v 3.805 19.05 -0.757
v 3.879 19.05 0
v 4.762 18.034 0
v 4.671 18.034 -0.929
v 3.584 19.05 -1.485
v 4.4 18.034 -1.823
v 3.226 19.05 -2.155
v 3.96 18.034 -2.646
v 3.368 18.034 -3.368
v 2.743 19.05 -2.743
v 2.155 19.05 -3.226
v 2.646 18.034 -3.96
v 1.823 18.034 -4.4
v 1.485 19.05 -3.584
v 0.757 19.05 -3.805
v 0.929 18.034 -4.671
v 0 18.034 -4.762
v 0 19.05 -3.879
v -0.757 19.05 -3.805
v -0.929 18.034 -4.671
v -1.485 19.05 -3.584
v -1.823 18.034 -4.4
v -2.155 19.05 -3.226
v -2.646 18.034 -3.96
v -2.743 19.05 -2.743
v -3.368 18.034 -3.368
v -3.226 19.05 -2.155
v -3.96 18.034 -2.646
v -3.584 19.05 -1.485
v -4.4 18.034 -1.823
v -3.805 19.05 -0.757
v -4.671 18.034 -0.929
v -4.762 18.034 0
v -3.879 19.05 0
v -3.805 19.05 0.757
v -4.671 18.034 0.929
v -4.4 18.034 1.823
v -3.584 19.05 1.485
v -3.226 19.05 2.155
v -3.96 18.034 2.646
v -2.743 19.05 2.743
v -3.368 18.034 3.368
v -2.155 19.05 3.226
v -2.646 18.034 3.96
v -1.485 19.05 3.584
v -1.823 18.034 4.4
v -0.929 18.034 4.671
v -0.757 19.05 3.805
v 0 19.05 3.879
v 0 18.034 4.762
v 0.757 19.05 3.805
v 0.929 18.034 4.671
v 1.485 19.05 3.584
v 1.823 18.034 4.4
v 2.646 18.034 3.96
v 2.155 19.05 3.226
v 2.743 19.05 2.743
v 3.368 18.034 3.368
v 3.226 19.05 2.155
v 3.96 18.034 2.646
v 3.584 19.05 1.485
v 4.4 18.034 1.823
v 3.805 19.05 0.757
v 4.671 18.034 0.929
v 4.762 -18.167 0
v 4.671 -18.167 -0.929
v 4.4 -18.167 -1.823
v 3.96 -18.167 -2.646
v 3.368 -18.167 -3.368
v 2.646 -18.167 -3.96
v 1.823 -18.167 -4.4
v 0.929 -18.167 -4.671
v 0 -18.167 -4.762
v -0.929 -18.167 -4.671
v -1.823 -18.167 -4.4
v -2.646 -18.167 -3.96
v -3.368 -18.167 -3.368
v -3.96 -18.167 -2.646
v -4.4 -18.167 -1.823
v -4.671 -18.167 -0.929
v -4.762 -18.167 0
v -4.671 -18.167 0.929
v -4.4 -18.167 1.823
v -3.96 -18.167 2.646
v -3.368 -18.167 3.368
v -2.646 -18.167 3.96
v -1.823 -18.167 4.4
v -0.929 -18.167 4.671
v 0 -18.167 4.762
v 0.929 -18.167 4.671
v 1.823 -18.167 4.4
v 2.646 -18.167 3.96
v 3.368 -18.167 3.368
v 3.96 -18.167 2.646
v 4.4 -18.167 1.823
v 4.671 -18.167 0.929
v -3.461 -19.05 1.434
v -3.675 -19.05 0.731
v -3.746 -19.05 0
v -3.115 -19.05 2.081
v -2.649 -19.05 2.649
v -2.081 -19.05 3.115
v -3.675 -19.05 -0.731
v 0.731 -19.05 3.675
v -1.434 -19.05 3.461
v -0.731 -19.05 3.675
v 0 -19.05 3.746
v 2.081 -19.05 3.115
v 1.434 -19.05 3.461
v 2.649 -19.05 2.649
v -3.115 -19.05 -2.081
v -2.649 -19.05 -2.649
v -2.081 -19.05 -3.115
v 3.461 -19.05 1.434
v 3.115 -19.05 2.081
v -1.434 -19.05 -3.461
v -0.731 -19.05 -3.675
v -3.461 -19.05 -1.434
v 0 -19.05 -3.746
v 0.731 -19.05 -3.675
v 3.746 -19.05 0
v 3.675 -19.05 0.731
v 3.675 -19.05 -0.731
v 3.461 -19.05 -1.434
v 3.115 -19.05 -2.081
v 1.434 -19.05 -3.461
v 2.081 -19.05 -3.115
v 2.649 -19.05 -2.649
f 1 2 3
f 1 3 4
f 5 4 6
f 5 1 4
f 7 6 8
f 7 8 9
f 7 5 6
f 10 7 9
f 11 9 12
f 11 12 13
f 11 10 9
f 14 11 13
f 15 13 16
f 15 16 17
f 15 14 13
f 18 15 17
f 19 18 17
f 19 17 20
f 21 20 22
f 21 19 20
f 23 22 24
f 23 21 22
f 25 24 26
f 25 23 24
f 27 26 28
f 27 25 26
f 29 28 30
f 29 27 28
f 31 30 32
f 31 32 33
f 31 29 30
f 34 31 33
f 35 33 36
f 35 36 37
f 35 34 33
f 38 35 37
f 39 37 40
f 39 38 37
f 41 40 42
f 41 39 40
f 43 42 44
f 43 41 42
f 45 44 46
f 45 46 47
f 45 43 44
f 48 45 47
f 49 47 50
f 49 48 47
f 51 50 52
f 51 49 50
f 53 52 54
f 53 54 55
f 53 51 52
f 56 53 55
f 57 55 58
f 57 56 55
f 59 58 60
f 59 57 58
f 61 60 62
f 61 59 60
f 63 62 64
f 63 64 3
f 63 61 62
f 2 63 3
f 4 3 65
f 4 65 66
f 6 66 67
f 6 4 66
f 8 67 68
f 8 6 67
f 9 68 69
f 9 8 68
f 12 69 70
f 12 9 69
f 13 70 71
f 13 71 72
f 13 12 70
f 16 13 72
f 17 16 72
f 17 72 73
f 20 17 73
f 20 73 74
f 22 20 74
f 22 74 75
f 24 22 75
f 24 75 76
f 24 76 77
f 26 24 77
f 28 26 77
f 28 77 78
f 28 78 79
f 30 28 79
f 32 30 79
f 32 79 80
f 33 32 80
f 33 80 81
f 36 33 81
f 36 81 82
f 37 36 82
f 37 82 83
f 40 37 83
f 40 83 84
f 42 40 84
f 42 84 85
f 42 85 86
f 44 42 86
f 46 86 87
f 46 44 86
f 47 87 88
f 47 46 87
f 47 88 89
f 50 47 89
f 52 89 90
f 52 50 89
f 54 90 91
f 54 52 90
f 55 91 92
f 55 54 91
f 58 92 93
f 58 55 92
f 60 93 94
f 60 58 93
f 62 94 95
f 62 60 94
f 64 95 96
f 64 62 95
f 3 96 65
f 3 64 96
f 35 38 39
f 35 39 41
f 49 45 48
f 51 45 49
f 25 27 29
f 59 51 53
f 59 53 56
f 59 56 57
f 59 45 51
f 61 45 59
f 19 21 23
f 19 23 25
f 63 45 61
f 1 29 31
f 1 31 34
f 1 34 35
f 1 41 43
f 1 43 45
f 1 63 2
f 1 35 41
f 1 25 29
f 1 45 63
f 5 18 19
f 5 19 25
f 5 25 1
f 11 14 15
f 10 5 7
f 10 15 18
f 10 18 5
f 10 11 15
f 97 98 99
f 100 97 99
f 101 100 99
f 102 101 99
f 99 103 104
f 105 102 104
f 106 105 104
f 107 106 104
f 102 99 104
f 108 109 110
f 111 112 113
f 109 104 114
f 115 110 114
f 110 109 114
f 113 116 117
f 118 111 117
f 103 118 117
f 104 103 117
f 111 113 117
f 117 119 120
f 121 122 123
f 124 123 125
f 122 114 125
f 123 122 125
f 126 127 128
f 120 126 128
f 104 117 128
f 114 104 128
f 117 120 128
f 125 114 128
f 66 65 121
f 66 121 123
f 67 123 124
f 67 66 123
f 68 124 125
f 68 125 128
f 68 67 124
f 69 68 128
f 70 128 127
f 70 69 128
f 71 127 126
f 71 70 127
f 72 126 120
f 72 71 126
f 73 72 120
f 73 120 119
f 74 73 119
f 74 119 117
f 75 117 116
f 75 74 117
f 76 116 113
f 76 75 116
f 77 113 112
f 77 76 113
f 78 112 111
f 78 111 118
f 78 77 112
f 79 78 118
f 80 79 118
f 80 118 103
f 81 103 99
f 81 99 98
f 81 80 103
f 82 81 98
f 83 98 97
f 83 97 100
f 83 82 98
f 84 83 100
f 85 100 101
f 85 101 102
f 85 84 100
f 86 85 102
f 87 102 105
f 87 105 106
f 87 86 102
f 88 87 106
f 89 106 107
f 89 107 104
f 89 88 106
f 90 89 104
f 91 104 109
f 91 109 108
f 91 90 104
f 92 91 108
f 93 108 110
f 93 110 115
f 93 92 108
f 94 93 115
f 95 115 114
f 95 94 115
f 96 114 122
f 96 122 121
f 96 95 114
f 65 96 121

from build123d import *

# Parameters (mm, degrees)
SKETCH1_R             = 4.7625
BOSS_EXTRUDE1_DEPTH   = 19.05
CHAMFER1_SIZE         = 1.016
CHAMFER1_SIZE2        = 0.883195326
CHAMFER1_PART_2_SIZE  = 1.016
CHAMFER1_PART_2_SIZE2 = 0.883195326


with BuildPart() as part:
    # Sketch1 → Boss-Extrude1 (new body, symmetric)
    with BuildSketch(Plane(origin=(0, 0, 0), x_dir=(1, 0, 0), z_dir=(0, 1, 0))):
        Circle(SKETCH1_R)
    extrude(amount=BOSS_EXTRUDE1_DEPTH, both=True)

    # Chamfer1
    chamfer1_edges = [part.edges().sort_by_distance(p)[0] for p in [
        (-4.7625, -19.05, 0),
    ]]
    chamfer1_side = [part.faces().sort_by_distance(p)[0] for p in [
        (0, -19.05, 0),
    ]]
    chamfer(chamfer1_edges, length=CHAMFER1_SIZE, length2=CHAMFER1_SIZE2, reference=chamfer1_side[0])

    # Chamfer1 part 2
    chamfer1_part_2_edges = [part.edges().sort_by_distance(p)[0] for p in [
        (-4.7625, 19.05, 0),
    ]]
    chamfer1_part_2_side = [part.faces().sort_by_distance(p)[0] for p in [
        (-4.7625, 0, 0),
    ]]
    chamfer(chamfer1_part_2_edges, length=CHAMFER1_PART_2_SIZE, length2=CHAMFER1_PART_2_SIZE2, reference=chamfer1_part_2_side[0])


solid = part.part
